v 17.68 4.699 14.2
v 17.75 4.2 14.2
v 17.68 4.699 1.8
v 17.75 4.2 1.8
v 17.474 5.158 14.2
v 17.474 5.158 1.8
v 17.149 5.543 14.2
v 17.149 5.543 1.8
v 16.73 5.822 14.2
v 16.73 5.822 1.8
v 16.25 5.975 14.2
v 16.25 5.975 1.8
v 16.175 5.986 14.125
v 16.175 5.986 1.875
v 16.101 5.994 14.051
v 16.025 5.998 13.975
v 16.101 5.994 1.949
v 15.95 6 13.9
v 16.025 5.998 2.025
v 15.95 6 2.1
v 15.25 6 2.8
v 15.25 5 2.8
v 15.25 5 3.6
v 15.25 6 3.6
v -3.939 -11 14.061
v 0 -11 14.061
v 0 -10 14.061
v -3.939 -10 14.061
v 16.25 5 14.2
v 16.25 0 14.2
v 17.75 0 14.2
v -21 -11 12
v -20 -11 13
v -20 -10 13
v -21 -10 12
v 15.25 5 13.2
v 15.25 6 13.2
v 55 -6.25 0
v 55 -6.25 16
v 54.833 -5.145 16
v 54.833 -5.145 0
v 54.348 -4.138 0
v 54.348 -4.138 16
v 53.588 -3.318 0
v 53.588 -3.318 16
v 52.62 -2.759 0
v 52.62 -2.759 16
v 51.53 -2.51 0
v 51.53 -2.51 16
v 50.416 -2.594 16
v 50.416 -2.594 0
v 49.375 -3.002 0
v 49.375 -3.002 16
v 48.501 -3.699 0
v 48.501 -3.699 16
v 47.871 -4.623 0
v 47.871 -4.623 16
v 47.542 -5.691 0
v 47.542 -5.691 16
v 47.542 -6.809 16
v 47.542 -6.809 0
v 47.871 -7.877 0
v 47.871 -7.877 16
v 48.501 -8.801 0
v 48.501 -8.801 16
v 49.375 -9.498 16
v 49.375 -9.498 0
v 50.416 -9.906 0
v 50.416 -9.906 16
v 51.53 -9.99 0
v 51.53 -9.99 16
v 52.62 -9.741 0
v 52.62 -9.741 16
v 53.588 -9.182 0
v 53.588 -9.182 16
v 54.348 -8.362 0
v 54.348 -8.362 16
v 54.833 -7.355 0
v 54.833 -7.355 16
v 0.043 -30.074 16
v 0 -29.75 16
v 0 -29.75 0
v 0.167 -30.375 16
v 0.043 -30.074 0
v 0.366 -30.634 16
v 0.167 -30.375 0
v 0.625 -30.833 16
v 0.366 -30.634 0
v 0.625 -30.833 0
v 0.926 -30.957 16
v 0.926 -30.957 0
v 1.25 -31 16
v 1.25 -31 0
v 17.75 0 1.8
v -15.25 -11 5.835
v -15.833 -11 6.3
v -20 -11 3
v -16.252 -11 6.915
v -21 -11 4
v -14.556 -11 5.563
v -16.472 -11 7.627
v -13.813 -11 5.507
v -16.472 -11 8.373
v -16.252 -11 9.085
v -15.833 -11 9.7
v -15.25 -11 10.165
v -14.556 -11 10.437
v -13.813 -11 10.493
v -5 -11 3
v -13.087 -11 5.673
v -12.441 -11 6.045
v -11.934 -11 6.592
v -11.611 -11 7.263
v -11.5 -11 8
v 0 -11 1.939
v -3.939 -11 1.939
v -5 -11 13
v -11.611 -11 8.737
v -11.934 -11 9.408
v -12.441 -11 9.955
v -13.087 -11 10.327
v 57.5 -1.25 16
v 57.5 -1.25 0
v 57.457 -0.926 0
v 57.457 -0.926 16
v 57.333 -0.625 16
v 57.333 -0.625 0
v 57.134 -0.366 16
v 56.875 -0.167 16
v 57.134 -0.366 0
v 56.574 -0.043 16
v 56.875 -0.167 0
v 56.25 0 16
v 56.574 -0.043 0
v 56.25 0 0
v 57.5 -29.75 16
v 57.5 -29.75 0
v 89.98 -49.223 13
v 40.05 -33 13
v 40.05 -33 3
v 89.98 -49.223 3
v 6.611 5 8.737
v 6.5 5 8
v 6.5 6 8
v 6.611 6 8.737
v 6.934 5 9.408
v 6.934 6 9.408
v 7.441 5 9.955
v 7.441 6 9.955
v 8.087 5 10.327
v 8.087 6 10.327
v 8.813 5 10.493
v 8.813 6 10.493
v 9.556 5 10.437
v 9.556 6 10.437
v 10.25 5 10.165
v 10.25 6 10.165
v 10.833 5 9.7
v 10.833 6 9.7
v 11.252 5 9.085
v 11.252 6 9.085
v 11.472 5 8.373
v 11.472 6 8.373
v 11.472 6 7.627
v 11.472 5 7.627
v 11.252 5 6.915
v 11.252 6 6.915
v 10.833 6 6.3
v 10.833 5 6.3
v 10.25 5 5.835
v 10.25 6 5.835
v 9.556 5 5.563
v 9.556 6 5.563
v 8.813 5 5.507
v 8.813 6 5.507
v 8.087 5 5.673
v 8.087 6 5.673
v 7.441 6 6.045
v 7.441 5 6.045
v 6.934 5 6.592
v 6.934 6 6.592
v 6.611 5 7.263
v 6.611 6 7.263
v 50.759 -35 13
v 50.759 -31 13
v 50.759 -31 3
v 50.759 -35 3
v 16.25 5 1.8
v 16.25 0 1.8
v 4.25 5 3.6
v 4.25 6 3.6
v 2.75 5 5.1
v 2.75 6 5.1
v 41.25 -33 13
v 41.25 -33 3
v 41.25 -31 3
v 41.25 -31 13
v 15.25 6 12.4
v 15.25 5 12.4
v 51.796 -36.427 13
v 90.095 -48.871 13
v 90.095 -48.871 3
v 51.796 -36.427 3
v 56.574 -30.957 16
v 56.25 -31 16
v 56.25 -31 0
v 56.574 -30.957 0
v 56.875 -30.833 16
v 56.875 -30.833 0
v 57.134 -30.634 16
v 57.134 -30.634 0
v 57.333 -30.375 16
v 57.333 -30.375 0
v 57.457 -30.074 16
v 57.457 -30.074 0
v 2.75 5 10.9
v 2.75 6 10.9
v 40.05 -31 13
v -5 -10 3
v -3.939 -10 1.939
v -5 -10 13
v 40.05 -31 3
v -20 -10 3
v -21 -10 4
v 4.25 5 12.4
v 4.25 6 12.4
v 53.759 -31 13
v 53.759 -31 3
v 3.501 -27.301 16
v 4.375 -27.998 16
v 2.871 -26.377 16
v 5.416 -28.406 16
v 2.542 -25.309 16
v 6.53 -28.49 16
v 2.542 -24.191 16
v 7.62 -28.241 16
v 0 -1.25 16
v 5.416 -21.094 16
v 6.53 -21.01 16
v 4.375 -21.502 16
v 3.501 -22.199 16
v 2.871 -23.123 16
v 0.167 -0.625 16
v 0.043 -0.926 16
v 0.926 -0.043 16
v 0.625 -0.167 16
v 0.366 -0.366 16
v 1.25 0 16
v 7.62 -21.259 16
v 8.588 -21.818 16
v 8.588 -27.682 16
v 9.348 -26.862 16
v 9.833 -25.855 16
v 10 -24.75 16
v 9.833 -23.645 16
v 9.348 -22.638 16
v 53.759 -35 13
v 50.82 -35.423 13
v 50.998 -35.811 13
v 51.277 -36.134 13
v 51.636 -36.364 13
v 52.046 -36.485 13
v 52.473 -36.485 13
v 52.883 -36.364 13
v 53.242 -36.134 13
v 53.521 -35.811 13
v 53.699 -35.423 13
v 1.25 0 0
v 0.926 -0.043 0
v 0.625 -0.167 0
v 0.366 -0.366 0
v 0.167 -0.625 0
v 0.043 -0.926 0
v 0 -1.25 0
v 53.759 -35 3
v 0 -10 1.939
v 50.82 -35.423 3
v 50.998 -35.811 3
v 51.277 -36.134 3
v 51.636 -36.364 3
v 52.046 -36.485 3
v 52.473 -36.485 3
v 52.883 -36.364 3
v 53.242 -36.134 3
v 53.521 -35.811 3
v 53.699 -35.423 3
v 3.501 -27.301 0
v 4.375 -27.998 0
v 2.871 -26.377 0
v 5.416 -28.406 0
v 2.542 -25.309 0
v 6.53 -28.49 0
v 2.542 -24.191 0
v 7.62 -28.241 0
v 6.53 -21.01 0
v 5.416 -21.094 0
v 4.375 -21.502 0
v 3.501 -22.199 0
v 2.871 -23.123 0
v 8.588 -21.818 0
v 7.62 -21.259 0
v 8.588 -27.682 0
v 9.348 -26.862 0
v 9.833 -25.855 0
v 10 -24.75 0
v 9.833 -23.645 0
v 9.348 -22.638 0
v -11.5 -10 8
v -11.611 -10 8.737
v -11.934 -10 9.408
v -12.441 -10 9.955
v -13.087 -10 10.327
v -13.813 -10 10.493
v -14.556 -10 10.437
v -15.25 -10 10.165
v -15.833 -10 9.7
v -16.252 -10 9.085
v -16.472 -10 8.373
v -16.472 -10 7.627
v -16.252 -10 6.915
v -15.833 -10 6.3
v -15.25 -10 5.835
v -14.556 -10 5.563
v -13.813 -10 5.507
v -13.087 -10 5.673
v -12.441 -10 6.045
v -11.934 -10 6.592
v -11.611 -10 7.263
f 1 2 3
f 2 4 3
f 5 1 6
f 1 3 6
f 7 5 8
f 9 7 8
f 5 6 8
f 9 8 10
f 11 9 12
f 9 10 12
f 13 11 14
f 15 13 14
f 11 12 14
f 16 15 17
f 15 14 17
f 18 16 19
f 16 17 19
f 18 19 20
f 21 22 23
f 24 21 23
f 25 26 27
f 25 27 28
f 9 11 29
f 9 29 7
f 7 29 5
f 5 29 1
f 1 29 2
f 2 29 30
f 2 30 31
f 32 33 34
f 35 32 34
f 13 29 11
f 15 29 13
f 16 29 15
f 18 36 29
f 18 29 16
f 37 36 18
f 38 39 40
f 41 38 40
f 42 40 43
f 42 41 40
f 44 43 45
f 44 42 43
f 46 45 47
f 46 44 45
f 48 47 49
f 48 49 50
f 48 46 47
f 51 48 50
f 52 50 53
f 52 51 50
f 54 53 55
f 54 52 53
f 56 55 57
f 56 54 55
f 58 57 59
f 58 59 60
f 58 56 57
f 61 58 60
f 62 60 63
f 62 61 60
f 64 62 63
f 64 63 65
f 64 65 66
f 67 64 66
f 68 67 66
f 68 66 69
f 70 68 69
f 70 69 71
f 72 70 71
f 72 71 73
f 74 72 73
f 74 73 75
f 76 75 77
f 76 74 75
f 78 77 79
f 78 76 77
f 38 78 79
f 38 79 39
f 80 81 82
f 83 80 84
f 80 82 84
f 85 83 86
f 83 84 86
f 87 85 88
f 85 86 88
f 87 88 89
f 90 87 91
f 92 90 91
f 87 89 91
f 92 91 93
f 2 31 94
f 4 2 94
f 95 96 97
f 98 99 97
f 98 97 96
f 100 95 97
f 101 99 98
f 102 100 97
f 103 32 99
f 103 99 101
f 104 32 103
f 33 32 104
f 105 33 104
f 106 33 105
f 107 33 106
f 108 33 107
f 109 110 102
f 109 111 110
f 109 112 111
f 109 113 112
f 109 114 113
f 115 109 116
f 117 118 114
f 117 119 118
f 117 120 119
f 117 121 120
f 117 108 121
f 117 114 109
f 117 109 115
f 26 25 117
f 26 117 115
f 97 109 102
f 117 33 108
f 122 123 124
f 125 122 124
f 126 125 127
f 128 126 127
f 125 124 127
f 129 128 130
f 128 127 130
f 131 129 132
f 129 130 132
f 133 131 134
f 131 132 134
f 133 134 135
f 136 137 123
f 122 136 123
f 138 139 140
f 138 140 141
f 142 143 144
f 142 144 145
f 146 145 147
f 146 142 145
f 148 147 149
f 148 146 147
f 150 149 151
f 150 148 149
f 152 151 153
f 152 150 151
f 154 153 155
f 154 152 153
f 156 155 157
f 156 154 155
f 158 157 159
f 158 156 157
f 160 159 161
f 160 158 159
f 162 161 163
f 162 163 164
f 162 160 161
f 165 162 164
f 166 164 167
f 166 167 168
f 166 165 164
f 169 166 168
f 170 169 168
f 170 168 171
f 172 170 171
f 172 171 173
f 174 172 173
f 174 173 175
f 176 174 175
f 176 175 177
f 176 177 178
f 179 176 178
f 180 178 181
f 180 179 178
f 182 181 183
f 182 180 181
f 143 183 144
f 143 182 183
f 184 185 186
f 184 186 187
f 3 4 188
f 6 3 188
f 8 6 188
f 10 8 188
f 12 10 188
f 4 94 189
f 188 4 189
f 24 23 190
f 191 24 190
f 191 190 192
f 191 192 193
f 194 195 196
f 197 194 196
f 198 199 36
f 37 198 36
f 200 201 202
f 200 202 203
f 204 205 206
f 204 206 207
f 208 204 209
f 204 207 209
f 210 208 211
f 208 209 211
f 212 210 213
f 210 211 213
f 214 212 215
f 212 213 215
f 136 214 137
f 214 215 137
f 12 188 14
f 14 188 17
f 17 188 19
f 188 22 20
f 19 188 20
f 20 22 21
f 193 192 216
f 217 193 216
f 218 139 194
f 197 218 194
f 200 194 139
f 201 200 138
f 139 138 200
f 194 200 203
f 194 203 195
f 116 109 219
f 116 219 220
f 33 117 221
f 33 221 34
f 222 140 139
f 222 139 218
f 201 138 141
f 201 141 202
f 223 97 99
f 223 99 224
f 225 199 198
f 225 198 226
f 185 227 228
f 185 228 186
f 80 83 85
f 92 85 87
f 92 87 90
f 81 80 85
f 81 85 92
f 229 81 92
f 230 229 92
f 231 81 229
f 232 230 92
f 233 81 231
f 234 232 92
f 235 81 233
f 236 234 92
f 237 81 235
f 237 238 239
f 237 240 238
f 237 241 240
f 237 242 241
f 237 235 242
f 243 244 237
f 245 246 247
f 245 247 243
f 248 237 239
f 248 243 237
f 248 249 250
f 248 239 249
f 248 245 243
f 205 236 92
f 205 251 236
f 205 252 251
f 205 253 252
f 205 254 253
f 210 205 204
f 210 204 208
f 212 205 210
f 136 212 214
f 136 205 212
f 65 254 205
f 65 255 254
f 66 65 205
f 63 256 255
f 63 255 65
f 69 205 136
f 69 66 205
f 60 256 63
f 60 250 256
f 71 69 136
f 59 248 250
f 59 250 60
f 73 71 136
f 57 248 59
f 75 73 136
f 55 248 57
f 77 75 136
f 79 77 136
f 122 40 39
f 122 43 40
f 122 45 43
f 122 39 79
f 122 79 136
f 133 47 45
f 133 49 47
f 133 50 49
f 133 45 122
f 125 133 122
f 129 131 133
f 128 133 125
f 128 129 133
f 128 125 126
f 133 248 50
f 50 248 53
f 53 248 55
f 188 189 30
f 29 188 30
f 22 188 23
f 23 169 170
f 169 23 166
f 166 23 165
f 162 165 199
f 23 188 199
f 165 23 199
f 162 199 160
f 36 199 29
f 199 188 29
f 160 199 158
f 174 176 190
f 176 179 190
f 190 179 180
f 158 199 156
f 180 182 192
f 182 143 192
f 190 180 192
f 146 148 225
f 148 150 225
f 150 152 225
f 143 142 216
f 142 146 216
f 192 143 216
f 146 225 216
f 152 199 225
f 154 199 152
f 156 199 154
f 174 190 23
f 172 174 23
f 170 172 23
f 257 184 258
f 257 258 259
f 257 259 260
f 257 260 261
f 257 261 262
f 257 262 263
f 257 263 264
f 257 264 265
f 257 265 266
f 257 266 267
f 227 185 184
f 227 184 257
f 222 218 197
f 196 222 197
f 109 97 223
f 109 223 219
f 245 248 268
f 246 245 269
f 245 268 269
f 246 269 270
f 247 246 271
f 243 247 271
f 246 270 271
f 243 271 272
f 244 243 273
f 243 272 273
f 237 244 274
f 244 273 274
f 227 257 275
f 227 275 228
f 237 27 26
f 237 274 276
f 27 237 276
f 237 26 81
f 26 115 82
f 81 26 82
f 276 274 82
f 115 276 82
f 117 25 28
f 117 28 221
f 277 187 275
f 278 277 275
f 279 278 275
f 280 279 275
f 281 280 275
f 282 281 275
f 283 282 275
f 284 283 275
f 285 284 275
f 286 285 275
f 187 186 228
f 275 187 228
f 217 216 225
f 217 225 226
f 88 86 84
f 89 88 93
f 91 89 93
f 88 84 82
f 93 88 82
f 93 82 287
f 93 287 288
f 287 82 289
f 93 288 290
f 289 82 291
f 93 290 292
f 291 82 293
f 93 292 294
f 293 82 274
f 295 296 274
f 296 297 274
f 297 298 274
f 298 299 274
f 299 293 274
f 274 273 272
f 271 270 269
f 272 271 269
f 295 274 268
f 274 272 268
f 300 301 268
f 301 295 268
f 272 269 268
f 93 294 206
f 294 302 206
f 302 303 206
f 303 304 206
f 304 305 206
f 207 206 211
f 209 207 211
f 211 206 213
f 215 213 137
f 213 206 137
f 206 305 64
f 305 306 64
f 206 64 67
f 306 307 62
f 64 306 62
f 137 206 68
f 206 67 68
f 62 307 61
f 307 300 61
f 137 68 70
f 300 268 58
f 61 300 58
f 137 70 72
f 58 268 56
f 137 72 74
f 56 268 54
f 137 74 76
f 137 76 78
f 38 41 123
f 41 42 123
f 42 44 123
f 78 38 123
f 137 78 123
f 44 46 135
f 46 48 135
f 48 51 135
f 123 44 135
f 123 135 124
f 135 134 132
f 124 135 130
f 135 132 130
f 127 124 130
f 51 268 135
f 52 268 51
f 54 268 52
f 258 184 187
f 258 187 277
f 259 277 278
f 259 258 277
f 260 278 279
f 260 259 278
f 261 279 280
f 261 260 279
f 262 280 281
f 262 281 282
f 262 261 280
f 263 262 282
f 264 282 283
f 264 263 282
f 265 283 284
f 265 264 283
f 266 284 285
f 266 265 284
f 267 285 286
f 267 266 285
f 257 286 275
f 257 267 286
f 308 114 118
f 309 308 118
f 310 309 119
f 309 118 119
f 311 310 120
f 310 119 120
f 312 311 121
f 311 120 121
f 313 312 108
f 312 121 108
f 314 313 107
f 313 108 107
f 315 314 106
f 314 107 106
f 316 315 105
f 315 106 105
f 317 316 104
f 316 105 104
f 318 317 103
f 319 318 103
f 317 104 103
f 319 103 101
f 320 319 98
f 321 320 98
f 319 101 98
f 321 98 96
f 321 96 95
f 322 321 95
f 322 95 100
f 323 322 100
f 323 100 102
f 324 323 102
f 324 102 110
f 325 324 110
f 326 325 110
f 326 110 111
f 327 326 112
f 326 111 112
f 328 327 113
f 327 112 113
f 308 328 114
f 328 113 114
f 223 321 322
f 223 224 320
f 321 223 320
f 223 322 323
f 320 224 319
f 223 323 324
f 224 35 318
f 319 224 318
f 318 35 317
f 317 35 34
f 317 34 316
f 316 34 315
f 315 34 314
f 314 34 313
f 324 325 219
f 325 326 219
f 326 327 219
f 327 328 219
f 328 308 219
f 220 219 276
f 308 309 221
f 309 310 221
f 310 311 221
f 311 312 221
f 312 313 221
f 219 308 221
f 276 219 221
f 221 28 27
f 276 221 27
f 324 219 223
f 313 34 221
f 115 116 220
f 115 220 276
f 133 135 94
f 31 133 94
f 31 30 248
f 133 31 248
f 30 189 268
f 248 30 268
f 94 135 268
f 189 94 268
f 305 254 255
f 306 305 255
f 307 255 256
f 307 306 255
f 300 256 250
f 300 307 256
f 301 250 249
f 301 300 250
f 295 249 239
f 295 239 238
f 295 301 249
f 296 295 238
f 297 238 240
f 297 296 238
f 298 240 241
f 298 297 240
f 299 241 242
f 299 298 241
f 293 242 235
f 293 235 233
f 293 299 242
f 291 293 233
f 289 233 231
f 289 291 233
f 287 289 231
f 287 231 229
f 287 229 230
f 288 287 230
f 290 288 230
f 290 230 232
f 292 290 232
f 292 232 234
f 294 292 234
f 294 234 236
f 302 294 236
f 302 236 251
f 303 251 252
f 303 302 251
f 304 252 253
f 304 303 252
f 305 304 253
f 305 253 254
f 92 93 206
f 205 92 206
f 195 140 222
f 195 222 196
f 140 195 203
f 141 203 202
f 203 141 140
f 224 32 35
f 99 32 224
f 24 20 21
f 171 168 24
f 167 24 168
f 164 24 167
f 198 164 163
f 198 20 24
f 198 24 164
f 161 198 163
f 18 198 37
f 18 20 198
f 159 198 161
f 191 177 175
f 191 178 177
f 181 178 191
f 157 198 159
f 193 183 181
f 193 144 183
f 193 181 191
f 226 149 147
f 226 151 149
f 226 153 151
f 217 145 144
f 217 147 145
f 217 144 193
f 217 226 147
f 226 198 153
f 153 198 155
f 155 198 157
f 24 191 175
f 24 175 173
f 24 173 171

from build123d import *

# Parameters (mm, degrees)
F0_R      = 3.75
F1_DEPTH  = 16
F3_START  = -20
F2_R      = 2.5
F3_DEPTH  = 1
F4_SIZE   = 1
F5_SIZE   = 1
F6_W      = 1.5
F6_H      = 12.4
F7_DEPTH  = 5
F8_W      = 12.5
F8_H      = 8.8
F8_R      = 2.5
F9_DEPTH  = 1
F10_R     = 1.8
F11_SIZE  = 1
F12_SIZE  = 1.5
F14_START = -3
F14_DEPTH = 10
F13_W     = 1.2
F13_H     = 2


with BuildPart() as f1:
    # F0 (on Top) → F1 (new body)
    with BuildSketch(Plane.XY):
        with BuildLine():
            ThreePointArc((2.5, -1.25), (2.1338834765, -0.3661165235), (1.25, 0))
            ThreePointArc((1.25, 0), (0.3661165235, -0.3661165235), (0, -1.25))
            ThreePointArc((0, -1.25), (1.25, -2.5), (2.5, -1.25))
        make_face()
        with BuildLine():
            ThreePointArc((2.5, -29.75), (1.25, -28.5), (0, -29.75))
            ThreePointArc((0, -29.75), (0.3661165235, -30.6338834765), (1.25, -31))
            ThreePointArc((1.25, -31), (2.1338834765, -30.6338834765), (2.5, -29.75))
        make_face()
        with BuildLine():
            ThreePointArc((56.25, -31), (57.1338834765, -30.6338834765), (57.5, -29.75))
            ThreePointArc((57.5, -29.75), (55.3661165235, -28.8661165235), (56.25, -31))
        make_face()
        with BuildLine():
            ThreePointArc((57.5, -1.25), (57.1338834765, -0.3661165235), (56.25, 0))
            ThreePointArc((56.25, 0), (55.3661165235, -2.1338834765), (57.5, -1.25))
        make_face()
        with BuildLine():
            Line((56.25, 0), (1.25, 0))
            ThreePointArc((1.25, 0), (2.1338834765, -0.3661165235), (2.5, -1.25))
            ThreePointArc((2.5, -1.25), (1.25, -2.5), (0, -1.25))
            Line((0, -1.25), (0, -29.75))
            ThreePointArc((0, -29.75), (1.25, -28.5), (2.5, -29.75))
            ThreePointArc((2.5, -29.75), (2.1338834765, -30.6338834765), (1.25, -31))
            Line((1.25, -31), (56.25, -31))
            ThreePointArc((56.25, -31), (55.3661165235, -28.8661165235), (57.5, -29.75))
            Line((57.5, -29.75), (57.5, -1.25))
            ThreePointArc((57.5, -1.25), (55.3661165235, -2.1338834765), (56.25, 0))
        make_face()
        with Locations((6.25, -24.75)):
            Circle(F0_R, mode=Mode.SUBTRACT)
        with Locations((51.25, -6.25)):
            Circle(F0_R, mode=Mode.SUBTRACT)
    extrude(amount=F1_DEPTH)

    # F2 (on face) → F3 (join)
    with BuildSketch(Plane.XZ.offset(31).offset(F3_START)):
        Polygon((0, 1.9393398282), (0, 3), (-5, 3), (-3.9393398282, 1.9393398282), align=None)
        Polygon((-5, 3), (0, 3), (0, 13), (-5, 13), (-21, 13), (-21, 3), align=None)
        with Locations((-14, 8)):
            Circle(F2_R, mode=Mode.SUBTRACT)
        Polygon((-5, 13), (0, 13), (0, 14.0606601718), (-3.9393398282, 14.0606601718), align=None)
    extrude(amount=-F3_DEPTH)

    # F4
    f4_edges = [f1.edges().sort_by_distance(p)[0] for p in [
        (-21, -10.5, 13),
    ]]
    chamfer(f4_edges, length=F4_SIZE)

    # F5
    f5_edges = [f1.edges().sort_by_distance(p)[0] for p in [
        (-21, -10.5, 3),
    ]]
    chamfer(f5_edges, length=F5_SIZE)

    # F6 (on face) → F7 (join)
    with BuildSketch(Plane(origin=(0, 0, 0), x_dir=(-1, 0, 0), z_dir=(0, 1, 0))):
        with Locations((-17, 8)):
            Rectangle(F6_W, F6_H)
    extrude(amount=F7_DEPTH)

    # F8 (on face) → F9 (join)
    with BuildSketch(Plane(origin=(0, 5, 0), x_dir=(-1, 0, 0), z_dir=(0, 1, 0))):
        Polygon((-15.25, 14.2), (-17.75, 14.2), (-17.75, 1.8), (-15.25, 1.8), (-15.25, 3.6), (-15.25, 12.4), align=None)
        with Locations((-9, 8)):
            Rectangle(F8_W, F8_H)
        with Locations((-9, 8)):
            Circle(F8_R, mode=Mode.SUBTRACT)
    extrude(amount=F9_DEPTH)

    # F10
    f10_edges = [f1.edges().sort_by_distance(p)[0] for p in [
        (17.75, 6, 8),
    ]]
    fillet(f10_edges, radius=F10_R)

    # F11
    f11_edges = [f1.edges().sort_by_distance(p)[0] for p in [
        (15.25, 5.5, 1.8),
        (15.25, 5.5, 14.2),
    ]]
    chamfer(f11_edges, length=F11_SIZE)

    # F12
    f12_edges = [f1.edges().sort_by_distance(p)[0] for p in [
        (2.75, 5.5, 3.6),
        (2.75, 5.5, 12.4),
    ]]
    chamfer(f12_edges, length=F12_SIZE)


with BuildPart() as f14:
    # F13 (on face) → F14 (new body)
    with BuildSketch(Plane.XY.offset(16).offset(F14_START)):
        with BuildLine():
            ThreePointArc((50.7594690406, -35), (51.0459435369, -35.8816778617), (51.7959435096, -36.4265847616))
            ThreePointArc((51.7959435096, -36.4265847616), (53.1411469023, -36.2135255037), (53.7594690406, -35))
            Line((53.7594690406, -35), (50.7594690406, -35))
        make_face()
        with BuildLine():
            ThreePointArc((53.7594690406, -35), (52.2594690406, -33.5), (50.7594690406, -35))
            Line((50.7594690406, -35), (53.7594690406, -35))
        make_face()
        with BuildLine():
            Line((50.7594690406, -31), (50.7594690406, -35))
            ThreePointArc((50.7594690406, -35), (52.2594690406, -33.5), (53.7594690406, -35))
            Line((53.7594690406, -35), (53.7594690406, -31))
            Line((53.7594690406, -31), (50.7594690406, -31))
        make_face()
    extrude(amount=-F14_DEPTH)


with BuildPart() as f14b:
    # F13 (on face) → F14, piece 2 (new body)
    with BuildSketch(Plane.XY.offset(16).offset(F14_START)):
        with Locations((40.65, -32)):
            Rectangle(F13_W, F13_H)
        Polygon((41.25, -33), (40.05, -33), (89.9804671055, -49.2233922047), (90.0950569089, -48.8707210533), (51.7959435096, -36.4265847616), align=None)
    extrude(amount=-F14_DEPTH)


solid = Compound([f1.part, f14.part, f14b.part])
